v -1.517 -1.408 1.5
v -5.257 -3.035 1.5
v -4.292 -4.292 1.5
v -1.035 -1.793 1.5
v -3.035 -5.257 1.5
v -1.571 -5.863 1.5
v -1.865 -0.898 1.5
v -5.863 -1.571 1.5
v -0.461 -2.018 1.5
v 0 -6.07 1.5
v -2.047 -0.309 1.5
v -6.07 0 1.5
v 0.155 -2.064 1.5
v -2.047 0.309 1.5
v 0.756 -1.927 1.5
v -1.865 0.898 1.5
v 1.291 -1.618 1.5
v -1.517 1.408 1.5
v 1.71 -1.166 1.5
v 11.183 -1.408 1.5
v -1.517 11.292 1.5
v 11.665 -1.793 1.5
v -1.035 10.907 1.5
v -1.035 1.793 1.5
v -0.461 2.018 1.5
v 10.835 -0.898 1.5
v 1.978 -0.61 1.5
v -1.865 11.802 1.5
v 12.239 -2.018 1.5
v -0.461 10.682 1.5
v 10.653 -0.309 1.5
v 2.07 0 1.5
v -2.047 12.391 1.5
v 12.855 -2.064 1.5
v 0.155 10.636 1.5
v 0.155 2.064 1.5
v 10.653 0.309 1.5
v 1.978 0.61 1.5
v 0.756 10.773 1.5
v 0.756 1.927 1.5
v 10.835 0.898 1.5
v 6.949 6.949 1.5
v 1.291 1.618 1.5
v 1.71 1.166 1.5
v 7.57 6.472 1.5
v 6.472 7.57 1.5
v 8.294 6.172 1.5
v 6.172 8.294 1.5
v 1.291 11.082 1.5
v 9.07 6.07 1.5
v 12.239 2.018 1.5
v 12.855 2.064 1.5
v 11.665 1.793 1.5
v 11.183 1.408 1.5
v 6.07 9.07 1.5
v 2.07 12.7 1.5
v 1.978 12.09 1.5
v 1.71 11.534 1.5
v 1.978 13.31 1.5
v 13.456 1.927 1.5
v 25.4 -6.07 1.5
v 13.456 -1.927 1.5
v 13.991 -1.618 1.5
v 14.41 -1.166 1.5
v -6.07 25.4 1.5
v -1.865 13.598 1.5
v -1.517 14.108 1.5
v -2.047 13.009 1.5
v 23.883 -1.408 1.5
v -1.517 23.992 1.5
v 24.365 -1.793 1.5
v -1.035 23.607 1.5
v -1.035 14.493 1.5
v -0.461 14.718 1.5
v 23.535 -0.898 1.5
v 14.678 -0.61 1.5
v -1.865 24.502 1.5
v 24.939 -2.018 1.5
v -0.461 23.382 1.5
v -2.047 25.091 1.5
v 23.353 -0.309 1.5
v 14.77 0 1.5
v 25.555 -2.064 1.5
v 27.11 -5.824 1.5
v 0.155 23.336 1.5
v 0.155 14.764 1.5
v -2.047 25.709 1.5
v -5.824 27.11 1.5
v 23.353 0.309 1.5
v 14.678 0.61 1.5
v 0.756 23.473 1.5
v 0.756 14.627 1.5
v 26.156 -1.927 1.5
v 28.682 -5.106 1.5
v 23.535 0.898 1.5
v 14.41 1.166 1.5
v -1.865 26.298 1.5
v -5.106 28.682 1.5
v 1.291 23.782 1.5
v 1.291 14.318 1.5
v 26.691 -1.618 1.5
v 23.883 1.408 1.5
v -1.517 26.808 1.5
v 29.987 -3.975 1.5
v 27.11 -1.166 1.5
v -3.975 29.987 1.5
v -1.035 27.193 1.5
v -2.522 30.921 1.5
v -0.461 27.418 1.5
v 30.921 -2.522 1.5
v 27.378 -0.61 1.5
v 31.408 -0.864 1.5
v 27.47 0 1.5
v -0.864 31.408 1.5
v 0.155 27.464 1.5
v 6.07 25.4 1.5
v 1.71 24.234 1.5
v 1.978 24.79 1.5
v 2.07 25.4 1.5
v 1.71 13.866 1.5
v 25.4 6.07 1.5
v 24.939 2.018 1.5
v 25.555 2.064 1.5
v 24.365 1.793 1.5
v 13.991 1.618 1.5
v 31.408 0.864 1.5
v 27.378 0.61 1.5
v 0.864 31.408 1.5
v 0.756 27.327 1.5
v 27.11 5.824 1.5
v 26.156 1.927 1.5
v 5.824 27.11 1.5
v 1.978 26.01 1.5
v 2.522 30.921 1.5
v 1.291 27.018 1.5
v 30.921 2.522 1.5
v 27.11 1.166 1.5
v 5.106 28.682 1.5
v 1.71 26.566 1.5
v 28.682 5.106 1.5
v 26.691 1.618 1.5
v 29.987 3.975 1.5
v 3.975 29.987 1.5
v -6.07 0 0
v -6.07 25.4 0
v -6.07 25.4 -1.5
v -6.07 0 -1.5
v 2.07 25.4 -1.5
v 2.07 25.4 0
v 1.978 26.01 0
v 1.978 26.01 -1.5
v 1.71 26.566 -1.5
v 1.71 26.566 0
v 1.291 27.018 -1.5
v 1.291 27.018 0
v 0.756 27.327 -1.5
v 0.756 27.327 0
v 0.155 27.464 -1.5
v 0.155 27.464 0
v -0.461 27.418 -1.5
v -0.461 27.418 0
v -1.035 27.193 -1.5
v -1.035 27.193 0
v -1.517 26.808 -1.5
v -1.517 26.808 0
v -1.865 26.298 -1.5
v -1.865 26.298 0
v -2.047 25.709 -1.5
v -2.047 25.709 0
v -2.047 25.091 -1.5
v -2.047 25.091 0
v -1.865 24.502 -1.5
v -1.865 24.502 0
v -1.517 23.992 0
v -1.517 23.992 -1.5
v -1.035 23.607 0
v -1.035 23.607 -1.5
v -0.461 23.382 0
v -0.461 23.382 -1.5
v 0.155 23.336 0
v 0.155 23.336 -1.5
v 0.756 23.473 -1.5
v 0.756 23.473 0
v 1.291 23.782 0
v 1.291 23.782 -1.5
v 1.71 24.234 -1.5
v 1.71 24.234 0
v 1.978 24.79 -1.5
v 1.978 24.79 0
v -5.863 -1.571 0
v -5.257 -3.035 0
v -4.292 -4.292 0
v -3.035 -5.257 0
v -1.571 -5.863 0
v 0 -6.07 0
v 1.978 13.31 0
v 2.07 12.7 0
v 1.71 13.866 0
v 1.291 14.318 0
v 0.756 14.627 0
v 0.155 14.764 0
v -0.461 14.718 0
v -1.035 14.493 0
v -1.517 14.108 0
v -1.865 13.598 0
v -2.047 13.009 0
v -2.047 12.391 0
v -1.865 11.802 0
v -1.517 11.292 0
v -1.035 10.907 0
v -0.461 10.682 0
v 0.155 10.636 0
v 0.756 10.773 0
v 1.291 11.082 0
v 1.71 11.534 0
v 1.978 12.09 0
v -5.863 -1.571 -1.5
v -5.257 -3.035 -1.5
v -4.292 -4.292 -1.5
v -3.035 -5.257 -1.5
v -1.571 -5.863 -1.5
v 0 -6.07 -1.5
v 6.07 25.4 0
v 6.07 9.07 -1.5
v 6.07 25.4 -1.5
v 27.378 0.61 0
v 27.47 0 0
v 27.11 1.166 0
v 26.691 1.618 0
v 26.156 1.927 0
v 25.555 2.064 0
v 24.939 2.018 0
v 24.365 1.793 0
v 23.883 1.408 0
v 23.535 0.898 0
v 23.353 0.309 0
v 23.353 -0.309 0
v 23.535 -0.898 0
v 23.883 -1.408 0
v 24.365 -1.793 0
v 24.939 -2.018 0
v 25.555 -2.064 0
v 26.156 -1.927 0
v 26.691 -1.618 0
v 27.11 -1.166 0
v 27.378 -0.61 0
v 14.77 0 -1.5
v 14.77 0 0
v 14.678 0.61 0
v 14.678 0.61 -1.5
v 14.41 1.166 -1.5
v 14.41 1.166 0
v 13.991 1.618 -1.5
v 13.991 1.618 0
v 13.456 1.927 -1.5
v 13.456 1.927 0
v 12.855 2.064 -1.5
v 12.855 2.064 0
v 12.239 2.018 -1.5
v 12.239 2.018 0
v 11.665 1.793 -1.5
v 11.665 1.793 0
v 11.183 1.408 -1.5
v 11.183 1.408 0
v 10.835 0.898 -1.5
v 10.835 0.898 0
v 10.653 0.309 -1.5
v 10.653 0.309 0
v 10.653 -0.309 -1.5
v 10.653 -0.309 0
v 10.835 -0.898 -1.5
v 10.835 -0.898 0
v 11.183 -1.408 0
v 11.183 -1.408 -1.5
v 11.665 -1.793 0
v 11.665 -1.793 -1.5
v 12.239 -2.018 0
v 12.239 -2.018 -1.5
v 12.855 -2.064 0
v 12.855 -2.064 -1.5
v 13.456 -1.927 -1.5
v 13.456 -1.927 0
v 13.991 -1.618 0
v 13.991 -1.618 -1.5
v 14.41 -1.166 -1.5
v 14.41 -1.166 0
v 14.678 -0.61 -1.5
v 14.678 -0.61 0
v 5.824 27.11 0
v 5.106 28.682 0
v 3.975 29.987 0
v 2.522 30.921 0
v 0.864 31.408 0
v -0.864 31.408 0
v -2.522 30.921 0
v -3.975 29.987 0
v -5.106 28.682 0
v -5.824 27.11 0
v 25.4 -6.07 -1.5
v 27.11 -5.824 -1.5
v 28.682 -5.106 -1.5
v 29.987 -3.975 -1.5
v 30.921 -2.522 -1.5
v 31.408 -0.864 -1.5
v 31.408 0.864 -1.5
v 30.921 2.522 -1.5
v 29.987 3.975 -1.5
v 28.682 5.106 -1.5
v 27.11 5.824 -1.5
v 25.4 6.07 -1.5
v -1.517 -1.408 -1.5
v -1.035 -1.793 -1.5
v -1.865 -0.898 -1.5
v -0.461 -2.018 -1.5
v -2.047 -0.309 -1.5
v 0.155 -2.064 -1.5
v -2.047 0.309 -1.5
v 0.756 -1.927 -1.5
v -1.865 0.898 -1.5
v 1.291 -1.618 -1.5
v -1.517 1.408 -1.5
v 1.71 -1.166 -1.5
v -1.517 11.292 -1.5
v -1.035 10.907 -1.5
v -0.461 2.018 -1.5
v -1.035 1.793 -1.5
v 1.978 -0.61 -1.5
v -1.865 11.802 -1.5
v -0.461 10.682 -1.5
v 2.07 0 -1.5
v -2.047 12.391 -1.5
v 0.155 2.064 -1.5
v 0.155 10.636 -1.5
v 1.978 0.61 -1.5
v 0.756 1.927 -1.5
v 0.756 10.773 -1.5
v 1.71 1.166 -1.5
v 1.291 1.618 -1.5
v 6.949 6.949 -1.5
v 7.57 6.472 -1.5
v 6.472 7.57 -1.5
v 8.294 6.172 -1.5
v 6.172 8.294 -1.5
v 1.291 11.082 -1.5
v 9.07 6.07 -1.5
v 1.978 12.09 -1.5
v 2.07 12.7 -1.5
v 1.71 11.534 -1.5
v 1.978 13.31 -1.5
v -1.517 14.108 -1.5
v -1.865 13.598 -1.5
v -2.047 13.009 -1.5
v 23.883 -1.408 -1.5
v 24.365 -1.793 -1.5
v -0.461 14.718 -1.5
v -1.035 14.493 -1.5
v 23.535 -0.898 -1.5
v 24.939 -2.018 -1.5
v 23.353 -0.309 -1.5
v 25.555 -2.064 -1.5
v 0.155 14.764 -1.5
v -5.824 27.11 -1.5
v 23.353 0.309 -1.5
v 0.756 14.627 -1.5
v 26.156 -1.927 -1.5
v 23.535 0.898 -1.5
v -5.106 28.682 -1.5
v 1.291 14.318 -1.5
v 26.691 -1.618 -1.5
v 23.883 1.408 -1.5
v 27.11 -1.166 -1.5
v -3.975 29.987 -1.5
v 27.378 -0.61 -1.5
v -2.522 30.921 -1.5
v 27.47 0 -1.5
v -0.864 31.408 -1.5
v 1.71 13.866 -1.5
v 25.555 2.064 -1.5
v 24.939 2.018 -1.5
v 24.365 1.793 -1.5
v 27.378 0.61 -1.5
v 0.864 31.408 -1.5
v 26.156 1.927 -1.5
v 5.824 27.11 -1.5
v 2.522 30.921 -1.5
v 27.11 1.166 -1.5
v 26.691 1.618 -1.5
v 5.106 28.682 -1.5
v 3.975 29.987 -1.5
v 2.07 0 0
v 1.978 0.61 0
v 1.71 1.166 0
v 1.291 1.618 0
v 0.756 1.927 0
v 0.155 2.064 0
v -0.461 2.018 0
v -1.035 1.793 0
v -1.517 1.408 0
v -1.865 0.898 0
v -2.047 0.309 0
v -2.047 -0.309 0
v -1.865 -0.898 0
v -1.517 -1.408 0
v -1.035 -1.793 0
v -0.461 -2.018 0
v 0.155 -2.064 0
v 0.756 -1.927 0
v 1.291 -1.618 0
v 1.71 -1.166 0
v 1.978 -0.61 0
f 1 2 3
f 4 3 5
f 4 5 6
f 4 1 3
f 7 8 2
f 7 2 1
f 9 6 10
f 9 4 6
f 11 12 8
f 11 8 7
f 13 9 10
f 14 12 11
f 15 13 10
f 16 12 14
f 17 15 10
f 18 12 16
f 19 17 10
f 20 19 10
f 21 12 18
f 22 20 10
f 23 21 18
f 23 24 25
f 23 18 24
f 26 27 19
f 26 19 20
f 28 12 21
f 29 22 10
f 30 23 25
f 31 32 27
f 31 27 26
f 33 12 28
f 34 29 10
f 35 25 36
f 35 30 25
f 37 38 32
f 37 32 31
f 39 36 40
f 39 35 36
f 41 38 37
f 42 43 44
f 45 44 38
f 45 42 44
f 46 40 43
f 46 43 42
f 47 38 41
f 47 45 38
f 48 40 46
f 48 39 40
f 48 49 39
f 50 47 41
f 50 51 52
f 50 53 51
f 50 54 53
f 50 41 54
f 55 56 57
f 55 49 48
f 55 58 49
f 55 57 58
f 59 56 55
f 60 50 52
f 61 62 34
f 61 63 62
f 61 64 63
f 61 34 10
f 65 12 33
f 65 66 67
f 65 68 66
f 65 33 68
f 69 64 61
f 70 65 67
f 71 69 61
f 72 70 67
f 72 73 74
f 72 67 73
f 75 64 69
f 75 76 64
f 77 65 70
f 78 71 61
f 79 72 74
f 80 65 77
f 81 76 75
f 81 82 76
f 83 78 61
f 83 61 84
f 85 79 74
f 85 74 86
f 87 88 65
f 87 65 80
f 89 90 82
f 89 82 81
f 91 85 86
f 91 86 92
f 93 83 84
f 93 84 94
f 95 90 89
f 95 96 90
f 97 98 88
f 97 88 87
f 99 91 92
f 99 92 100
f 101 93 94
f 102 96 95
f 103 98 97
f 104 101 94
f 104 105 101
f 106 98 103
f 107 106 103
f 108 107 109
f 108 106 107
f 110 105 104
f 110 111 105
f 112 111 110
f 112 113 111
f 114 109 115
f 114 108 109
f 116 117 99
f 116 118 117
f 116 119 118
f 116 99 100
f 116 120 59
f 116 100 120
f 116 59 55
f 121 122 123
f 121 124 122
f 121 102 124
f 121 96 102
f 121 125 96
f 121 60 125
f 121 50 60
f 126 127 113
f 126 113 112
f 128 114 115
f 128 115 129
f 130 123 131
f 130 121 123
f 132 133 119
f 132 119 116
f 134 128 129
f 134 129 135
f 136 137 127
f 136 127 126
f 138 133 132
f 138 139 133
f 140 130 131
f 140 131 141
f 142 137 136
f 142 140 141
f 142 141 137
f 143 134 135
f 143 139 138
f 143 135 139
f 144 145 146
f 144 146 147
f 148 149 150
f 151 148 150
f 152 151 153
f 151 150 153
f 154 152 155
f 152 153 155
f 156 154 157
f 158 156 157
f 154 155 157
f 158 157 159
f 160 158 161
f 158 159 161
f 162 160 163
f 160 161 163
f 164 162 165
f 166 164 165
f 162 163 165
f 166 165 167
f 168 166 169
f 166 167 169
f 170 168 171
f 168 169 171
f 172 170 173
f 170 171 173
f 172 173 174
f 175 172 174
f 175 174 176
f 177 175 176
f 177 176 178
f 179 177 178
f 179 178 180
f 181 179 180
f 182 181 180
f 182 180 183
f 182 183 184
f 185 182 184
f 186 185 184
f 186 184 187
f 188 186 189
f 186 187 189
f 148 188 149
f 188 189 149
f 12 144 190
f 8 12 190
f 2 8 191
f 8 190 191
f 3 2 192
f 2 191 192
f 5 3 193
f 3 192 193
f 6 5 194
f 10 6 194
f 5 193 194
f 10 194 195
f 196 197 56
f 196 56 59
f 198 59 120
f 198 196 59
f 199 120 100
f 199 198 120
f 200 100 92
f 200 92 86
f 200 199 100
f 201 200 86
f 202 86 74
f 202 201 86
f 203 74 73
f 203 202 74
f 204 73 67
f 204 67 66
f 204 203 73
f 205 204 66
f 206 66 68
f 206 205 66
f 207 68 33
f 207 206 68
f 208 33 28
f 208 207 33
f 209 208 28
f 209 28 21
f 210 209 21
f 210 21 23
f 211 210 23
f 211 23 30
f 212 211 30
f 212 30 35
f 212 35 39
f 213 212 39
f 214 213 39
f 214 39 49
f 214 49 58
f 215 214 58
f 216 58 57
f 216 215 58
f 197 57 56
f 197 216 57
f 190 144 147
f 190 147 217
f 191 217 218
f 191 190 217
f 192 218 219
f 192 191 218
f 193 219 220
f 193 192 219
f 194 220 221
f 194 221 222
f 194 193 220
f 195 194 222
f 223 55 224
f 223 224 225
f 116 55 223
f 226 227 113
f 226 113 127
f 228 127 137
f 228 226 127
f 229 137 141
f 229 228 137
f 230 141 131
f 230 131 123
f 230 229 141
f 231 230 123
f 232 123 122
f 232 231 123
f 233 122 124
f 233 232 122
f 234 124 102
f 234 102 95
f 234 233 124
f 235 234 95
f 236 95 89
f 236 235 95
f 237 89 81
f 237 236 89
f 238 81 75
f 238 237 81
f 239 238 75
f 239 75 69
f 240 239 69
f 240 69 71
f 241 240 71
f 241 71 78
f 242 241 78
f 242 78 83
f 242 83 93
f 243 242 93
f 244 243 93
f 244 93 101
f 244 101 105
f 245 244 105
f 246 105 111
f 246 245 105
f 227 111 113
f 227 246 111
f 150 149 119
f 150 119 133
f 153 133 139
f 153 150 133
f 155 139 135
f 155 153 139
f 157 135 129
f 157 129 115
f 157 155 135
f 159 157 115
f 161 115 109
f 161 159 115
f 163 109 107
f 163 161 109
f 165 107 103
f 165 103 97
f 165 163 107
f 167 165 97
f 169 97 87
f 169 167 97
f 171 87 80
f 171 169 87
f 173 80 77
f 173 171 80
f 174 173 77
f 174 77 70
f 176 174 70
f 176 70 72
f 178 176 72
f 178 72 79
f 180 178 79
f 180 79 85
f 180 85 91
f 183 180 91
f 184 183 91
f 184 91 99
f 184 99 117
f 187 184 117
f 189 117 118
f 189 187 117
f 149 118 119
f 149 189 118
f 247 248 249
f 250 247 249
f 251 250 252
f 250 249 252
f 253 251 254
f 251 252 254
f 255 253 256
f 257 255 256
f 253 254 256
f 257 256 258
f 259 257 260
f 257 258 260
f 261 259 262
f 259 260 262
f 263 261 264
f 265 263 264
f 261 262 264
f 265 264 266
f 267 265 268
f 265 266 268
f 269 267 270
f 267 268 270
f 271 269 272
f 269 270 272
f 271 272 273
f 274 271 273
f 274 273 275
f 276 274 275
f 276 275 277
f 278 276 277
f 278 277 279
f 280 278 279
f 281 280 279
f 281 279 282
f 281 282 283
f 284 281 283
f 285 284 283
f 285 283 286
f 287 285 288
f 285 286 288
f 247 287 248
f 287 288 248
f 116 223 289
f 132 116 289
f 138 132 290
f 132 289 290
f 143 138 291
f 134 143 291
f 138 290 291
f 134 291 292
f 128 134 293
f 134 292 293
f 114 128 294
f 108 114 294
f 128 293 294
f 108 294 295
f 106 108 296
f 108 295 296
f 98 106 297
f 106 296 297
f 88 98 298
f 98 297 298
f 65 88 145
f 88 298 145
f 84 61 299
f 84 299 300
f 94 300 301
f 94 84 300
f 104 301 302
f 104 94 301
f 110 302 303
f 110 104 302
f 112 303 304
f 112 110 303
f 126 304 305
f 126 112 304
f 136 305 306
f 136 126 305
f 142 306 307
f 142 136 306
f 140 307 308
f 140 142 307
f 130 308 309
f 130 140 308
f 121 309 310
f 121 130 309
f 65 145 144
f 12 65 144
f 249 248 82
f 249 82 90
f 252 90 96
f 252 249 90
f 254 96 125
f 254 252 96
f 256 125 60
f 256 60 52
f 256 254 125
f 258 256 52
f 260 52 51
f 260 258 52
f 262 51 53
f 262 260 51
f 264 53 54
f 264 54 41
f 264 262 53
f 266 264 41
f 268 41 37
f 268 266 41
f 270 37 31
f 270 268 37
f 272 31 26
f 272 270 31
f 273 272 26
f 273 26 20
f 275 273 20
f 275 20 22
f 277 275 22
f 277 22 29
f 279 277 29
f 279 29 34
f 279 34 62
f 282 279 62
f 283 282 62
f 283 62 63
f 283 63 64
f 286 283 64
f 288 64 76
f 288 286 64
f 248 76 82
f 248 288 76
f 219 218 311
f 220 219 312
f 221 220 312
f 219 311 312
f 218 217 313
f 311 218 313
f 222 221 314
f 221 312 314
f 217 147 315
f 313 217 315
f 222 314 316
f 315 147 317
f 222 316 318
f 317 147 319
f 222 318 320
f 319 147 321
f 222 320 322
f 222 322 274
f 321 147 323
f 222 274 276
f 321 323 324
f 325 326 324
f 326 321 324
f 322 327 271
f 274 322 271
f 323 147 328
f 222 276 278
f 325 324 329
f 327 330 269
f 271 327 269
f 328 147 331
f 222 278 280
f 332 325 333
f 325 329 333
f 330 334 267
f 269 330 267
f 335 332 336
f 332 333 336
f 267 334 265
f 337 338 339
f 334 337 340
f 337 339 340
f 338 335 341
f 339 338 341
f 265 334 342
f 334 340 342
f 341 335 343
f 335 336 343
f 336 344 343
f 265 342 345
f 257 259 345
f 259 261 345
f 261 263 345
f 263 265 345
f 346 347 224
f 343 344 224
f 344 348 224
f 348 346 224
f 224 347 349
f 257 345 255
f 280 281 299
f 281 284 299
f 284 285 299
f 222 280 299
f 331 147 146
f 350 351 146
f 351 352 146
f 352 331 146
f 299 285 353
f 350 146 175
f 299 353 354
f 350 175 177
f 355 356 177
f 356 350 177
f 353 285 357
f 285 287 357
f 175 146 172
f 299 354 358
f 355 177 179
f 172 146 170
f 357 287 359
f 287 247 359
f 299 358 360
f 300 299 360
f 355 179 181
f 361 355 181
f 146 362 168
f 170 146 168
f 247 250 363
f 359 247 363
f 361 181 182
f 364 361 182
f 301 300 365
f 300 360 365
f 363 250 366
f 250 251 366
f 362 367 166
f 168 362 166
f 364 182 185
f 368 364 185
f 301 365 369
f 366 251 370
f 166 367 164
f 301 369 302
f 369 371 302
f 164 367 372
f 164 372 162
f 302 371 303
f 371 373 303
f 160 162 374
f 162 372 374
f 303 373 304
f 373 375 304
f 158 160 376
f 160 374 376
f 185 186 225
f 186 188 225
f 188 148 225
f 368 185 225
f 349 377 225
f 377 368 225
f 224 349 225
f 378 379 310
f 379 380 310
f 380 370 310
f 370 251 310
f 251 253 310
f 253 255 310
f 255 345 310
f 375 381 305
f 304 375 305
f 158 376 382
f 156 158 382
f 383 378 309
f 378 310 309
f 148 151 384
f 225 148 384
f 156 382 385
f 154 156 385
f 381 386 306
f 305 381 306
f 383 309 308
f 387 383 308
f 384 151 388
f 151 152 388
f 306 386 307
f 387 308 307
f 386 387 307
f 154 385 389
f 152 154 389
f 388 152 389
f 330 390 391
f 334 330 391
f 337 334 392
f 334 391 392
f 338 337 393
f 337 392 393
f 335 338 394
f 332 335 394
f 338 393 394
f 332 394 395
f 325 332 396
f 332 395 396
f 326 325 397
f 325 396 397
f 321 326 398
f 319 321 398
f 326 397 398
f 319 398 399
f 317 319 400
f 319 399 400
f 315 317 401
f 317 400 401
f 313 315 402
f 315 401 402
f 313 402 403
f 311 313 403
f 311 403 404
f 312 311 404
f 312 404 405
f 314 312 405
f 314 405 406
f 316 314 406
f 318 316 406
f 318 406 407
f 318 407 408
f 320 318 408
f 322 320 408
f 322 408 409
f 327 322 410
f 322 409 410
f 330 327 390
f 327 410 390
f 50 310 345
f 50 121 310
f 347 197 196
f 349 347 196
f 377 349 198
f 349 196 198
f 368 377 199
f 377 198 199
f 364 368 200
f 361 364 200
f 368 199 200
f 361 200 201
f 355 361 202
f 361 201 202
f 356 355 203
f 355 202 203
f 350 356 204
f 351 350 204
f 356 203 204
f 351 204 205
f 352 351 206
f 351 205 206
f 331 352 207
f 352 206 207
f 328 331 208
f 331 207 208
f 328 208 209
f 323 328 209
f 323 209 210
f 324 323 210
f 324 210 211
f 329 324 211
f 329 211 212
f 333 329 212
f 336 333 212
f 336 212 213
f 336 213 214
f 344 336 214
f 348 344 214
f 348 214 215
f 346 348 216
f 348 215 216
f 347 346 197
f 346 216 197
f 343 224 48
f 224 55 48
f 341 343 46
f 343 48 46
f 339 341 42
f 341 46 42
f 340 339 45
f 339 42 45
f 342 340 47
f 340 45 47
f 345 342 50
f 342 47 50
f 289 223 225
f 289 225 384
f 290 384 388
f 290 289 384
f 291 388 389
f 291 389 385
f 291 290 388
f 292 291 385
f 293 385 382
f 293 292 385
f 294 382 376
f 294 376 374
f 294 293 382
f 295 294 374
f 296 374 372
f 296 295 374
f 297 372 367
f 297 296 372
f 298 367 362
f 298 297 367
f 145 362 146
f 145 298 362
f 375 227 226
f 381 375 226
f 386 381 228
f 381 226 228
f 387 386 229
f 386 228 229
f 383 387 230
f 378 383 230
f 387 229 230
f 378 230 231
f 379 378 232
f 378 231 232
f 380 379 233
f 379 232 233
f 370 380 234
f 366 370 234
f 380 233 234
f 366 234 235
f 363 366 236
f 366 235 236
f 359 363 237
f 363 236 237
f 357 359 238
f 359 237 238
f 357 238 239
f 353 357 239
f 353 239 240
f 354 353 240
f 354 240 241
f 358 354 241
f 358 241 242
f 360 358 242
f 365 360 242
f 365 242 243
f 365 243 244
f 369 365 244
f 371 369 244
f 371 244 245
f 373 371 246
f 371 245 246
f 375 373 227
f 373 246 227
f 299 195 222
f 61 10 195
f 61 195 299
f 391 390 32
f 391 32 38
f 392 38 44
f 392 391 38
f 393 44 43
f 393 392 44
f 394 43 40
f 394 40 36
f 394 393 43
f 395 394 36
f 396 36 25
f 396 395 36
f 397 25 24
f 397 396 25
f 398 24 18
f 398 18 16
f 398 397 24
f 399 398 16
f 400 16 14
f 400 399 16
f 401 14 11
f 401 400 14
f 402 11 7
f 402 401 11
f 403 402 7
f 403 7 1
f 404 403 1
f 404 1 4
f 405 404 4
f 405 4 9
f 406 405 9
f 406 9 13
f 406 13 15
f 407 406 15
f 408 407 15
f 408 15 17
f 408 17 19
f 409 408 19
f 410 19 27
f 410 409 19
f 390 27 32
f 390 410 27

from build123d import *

# Parameters (mm, degrees)
SKETCH1_R           = 2.07
SKETCH1_R_2         = 6.07
BOSS_EXTRUDE1_DEPTH = 1.5
FILLET1_R           = 3


with BuildPart() as part:
    # Sketch1 → Boss-Extrude1 (new, symmetric)
    # profile 1 of 5: a face of its own
    with BuildSketch(Plane.XY):
        with BuildLine():
            ThreePointArc((6.07, 25.4), (0, 19.33), (-6.07, 25.4))
            Line((-6.07, 25.4), (-6.07, 0))
            ThreePointArc((-6.07, 0), (0, 6.07), (6.07, 0))
            Line((6.07, 0), (6.07, 6.07))
            Line((6.07, 6.07), (6.07, 25.4))
        make_face()
        with Locations((0, 12.7)):
            Circle(SKETCH1_R, mode=Mode.SUBTRACT)
    # profile 2 of 5: a face of its own
    with BuildSketch(Plane.XY):
        with Locations((0, 25.4)):
            Circle(SKETCH1_R_2)
        with Locations((0, 25.4)):
            Circle(SKETCH1_R, mode=Mode.SUBTRACT)
    # profile 3 of 5: a face of its own
    with BuildSketch(Plane.XY):
        Circle(SKETCH1_R_2)
        Circle(SKETCH1_R, mode=Mode.SUBTRACT)
    # profile 4 of 5: a face of its own
    with BuildSketch(Plane.XY):
        with BuildLine():
            Line((6.07, 6.07), (6.07, 0))
            ThreePointArc((6.07, 0), (4.292138162, -4.292138162), (0, -6.07))
            Line((0, -6.07), (25.4, -6.07))
            ThreePointArc((25.4, -6.07), (19.33, 0), (25.4, 6.07))
            Line((25.4, 6.07), (6.07, 6.07))
        make_face()
        with Locations((12.7, 0)):
            Circle(SKETCH1_R, mode=Mode.SUBTRACT)
    # profile 5 of 5: a face of its own
    with BuildSketch(Plane.XY):
        with Locations((25.4, 0)):
            Circle(SKETCH1_R_2)
        with Locations((25.4, 0)):
            Circle(SKETCH1_R, mode=Mode.SUBTRACT)
    extrude(amount=BOSS_EXTRUDE1_DEPTH, both=True)

    # Fillet1
    fillet1_edges = [part.edges().sort_by_distance(p)[0] for p in [
        (6.07, 6.07, 0),
    ]]
    fillet(fillet1_edges, radius=FILLET1_R)


solid = part.part
